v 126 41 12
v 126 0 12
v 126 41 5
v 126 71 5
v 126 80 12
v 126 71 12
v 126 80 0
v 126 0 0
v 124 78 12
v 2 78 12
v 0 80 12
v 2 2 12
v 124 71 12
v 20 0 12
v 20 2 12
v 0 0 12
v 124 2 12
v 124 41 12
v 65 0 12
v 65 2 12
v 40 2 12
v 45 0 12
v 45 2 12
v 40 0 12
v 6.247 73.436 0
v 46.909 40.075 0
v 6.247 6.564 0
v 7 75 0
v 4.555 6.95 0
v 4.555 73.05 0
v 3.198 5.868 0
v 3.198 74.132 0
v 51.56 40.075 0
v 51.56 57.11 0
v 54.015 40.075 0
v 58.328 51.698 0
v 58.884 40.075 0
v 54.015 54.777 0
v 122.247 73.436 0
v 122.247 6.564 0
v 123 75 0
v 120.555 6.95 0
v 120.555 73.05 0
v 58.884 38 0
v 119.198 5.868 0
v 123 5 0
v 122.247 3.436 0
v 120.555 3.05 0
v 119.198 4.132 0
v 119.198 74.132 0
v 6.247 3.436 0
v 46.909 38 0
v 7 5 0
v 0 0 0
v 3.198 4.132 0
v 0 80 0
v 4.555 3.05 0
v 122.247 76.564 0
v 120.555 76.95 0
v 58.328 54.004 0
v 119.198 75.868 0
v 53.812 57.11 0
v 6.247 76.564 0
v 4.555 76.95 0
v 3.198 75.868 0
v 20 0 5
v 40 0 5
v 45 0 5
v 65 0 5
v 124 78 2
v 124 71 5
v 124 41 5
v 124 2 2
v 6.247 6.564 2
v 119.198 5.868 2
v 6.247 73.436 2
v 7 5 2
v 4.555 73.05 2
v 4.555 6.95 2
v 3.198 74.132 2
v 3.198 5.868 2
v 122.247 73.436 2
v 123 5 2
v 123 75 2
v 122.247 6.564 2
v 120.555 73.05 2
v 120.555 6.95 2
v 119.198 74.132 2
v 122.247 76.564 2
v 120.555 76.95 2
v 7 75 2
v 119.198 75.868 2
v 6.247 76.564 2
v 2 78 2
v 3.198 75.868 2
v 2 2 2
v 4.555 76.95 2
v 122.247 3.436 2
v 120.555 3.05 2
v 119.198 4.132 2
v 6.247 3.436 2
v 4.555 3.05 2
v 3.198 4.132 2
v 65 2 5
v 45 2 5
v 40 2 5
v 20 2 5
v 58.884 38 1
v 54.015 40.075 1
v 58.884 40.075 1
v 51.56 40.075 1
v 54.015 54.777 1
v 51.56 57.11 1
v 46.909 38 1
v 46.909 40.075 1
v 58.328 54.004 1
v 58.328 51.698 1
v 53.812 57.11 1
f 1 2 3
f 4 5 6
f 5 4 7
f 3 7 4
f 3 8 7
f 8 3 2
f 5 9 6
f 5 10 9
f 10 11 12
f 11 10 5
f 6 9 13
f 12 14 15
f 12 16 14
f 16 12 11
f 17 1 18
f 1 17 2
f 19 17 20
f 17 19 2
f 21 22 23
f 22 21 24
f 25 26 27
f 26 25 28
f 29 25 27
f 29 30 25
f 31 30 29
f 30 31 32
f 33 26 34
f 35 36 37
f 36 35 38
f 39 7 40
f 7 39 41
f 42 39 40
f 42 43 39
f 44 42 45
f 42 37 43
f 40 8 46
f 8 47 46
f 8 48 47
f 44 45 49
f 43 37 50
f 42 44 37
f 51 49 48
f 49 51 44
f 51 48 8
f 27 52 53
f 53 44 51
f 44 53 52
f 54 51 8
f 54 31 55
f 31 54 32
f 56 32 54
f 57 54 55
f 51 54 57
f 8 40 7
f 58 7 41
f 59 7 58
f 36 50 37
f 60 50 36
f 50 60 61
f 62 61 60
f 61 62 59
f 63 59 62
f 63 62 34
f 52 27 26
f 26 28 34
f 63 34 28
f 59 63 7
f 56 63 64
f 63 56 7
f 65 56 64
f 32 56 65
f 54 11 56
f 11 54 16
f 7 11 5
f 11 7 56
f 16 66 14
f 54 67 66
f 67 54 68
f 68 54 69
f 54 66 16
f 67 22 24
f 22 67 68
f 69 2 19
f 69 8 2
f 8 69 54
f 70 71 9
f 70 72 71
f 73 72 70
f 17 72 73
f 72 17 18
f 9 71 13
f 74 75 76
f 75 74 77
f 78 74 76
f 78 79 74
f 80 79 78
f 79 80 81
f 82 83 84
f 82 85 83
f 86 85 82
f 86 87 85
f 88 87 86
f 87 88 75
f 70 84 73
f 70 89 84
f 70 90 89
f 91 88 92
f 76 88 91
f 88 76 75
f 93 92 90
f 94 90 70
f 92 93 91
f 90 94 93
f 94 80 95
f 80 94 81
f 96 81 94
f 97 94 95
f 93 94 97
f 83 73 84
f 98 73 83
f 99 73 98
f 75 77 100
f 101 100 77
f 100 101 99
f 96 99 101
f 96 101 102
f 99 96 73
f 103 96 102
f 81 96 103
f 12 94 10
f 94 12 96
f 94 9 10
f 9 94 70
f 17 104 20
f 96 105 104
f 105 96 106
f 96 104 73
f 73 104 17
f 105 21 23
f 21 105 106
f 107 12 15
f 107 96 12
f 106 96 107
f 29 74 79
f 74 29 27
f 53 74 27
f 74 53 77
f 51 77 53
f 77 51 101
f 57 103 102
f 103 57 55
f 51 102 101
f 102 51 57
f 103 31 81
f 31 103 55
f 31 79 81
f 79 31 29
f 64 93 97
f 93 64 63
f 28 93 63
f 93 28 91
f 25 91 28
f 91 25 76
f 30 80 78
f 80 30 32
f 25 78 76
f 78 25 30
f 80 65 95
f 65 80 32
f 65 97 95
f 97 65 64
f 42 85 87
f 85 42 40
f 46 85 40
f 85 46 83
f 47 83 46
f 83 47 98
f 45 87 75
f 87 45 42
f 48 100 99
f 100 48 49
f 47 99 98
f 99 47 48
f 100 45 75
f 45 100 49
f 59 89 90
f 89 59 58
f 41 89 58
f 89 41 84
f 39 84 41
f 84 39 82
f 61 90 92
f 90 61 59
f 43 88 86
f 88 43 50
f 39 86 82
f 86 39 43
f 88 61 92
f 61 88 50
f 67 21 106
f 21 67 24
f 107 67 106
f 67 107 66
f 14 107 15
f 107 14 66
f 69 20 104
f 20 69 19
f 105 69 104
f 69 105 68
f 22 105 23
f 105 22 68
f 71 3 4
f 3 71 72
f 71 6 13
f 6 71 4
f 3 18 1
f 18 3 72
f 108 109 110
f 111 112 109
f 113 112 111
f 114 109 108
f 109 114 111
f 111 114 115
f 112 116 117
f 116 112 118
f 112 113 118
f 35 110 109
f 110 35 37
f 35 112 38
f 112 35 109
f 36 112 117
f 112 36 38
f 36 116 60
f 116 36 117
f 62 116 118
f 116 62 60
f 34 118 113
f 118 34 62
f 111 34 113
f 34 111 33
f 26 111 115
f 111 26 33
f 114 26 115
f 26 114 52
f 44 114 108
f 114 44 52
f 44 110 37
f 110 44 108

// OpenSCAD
BaseLength = 122;
BaseDepth = 76;
BaseHeight = 12;
module mount_plate() {
  difference() {
    cube([BaseLength+4,BaseDepth+4,BaseHeight]);
    translate([2,2,2])
      cube([BaseLength,BaseDepth,BaseHeight]);
    // holes for panel mount
    translate([5,5,-1])
      cylinder(4,2,2);
    translate([5,BaseDepth-1,-1])
      cylinder(4,2,2);
    translate([BaseLength-1,5,-1])
      cylinder(4,2,2);
    translate([BaseLength-1,BaseDepth-1,-1])
      cylinder(4,2,2);
  }  
}

module port_holes() {
  UsbOffsetX=20;
  UsbLength=20;
  UsbPortGap=5;
  // usb c
  translate([UsbOffsetX,-1,5])
    color("#ff0000")
    cube([UsbLength,4,8]);
  translate([UsbOffsetX+UsbLength+UsbPortGap,-1,5])
    color("#ff0000")
    cube([UsbLength,4,8]);
  // sdcard
  translate([BaseLength+1,BaseDepth-35,5])
    color("#ff0000")
    cube([4,30,8]);
}



difference() {
  mount_plate();
  port_holes();

  // version
  translate([BaseLength/2,BaseDepth/2,-1])
    color("#ff0000")
    linear_extrude(2)
    rotate([0,180,0])
    text("1", size=20);
}
